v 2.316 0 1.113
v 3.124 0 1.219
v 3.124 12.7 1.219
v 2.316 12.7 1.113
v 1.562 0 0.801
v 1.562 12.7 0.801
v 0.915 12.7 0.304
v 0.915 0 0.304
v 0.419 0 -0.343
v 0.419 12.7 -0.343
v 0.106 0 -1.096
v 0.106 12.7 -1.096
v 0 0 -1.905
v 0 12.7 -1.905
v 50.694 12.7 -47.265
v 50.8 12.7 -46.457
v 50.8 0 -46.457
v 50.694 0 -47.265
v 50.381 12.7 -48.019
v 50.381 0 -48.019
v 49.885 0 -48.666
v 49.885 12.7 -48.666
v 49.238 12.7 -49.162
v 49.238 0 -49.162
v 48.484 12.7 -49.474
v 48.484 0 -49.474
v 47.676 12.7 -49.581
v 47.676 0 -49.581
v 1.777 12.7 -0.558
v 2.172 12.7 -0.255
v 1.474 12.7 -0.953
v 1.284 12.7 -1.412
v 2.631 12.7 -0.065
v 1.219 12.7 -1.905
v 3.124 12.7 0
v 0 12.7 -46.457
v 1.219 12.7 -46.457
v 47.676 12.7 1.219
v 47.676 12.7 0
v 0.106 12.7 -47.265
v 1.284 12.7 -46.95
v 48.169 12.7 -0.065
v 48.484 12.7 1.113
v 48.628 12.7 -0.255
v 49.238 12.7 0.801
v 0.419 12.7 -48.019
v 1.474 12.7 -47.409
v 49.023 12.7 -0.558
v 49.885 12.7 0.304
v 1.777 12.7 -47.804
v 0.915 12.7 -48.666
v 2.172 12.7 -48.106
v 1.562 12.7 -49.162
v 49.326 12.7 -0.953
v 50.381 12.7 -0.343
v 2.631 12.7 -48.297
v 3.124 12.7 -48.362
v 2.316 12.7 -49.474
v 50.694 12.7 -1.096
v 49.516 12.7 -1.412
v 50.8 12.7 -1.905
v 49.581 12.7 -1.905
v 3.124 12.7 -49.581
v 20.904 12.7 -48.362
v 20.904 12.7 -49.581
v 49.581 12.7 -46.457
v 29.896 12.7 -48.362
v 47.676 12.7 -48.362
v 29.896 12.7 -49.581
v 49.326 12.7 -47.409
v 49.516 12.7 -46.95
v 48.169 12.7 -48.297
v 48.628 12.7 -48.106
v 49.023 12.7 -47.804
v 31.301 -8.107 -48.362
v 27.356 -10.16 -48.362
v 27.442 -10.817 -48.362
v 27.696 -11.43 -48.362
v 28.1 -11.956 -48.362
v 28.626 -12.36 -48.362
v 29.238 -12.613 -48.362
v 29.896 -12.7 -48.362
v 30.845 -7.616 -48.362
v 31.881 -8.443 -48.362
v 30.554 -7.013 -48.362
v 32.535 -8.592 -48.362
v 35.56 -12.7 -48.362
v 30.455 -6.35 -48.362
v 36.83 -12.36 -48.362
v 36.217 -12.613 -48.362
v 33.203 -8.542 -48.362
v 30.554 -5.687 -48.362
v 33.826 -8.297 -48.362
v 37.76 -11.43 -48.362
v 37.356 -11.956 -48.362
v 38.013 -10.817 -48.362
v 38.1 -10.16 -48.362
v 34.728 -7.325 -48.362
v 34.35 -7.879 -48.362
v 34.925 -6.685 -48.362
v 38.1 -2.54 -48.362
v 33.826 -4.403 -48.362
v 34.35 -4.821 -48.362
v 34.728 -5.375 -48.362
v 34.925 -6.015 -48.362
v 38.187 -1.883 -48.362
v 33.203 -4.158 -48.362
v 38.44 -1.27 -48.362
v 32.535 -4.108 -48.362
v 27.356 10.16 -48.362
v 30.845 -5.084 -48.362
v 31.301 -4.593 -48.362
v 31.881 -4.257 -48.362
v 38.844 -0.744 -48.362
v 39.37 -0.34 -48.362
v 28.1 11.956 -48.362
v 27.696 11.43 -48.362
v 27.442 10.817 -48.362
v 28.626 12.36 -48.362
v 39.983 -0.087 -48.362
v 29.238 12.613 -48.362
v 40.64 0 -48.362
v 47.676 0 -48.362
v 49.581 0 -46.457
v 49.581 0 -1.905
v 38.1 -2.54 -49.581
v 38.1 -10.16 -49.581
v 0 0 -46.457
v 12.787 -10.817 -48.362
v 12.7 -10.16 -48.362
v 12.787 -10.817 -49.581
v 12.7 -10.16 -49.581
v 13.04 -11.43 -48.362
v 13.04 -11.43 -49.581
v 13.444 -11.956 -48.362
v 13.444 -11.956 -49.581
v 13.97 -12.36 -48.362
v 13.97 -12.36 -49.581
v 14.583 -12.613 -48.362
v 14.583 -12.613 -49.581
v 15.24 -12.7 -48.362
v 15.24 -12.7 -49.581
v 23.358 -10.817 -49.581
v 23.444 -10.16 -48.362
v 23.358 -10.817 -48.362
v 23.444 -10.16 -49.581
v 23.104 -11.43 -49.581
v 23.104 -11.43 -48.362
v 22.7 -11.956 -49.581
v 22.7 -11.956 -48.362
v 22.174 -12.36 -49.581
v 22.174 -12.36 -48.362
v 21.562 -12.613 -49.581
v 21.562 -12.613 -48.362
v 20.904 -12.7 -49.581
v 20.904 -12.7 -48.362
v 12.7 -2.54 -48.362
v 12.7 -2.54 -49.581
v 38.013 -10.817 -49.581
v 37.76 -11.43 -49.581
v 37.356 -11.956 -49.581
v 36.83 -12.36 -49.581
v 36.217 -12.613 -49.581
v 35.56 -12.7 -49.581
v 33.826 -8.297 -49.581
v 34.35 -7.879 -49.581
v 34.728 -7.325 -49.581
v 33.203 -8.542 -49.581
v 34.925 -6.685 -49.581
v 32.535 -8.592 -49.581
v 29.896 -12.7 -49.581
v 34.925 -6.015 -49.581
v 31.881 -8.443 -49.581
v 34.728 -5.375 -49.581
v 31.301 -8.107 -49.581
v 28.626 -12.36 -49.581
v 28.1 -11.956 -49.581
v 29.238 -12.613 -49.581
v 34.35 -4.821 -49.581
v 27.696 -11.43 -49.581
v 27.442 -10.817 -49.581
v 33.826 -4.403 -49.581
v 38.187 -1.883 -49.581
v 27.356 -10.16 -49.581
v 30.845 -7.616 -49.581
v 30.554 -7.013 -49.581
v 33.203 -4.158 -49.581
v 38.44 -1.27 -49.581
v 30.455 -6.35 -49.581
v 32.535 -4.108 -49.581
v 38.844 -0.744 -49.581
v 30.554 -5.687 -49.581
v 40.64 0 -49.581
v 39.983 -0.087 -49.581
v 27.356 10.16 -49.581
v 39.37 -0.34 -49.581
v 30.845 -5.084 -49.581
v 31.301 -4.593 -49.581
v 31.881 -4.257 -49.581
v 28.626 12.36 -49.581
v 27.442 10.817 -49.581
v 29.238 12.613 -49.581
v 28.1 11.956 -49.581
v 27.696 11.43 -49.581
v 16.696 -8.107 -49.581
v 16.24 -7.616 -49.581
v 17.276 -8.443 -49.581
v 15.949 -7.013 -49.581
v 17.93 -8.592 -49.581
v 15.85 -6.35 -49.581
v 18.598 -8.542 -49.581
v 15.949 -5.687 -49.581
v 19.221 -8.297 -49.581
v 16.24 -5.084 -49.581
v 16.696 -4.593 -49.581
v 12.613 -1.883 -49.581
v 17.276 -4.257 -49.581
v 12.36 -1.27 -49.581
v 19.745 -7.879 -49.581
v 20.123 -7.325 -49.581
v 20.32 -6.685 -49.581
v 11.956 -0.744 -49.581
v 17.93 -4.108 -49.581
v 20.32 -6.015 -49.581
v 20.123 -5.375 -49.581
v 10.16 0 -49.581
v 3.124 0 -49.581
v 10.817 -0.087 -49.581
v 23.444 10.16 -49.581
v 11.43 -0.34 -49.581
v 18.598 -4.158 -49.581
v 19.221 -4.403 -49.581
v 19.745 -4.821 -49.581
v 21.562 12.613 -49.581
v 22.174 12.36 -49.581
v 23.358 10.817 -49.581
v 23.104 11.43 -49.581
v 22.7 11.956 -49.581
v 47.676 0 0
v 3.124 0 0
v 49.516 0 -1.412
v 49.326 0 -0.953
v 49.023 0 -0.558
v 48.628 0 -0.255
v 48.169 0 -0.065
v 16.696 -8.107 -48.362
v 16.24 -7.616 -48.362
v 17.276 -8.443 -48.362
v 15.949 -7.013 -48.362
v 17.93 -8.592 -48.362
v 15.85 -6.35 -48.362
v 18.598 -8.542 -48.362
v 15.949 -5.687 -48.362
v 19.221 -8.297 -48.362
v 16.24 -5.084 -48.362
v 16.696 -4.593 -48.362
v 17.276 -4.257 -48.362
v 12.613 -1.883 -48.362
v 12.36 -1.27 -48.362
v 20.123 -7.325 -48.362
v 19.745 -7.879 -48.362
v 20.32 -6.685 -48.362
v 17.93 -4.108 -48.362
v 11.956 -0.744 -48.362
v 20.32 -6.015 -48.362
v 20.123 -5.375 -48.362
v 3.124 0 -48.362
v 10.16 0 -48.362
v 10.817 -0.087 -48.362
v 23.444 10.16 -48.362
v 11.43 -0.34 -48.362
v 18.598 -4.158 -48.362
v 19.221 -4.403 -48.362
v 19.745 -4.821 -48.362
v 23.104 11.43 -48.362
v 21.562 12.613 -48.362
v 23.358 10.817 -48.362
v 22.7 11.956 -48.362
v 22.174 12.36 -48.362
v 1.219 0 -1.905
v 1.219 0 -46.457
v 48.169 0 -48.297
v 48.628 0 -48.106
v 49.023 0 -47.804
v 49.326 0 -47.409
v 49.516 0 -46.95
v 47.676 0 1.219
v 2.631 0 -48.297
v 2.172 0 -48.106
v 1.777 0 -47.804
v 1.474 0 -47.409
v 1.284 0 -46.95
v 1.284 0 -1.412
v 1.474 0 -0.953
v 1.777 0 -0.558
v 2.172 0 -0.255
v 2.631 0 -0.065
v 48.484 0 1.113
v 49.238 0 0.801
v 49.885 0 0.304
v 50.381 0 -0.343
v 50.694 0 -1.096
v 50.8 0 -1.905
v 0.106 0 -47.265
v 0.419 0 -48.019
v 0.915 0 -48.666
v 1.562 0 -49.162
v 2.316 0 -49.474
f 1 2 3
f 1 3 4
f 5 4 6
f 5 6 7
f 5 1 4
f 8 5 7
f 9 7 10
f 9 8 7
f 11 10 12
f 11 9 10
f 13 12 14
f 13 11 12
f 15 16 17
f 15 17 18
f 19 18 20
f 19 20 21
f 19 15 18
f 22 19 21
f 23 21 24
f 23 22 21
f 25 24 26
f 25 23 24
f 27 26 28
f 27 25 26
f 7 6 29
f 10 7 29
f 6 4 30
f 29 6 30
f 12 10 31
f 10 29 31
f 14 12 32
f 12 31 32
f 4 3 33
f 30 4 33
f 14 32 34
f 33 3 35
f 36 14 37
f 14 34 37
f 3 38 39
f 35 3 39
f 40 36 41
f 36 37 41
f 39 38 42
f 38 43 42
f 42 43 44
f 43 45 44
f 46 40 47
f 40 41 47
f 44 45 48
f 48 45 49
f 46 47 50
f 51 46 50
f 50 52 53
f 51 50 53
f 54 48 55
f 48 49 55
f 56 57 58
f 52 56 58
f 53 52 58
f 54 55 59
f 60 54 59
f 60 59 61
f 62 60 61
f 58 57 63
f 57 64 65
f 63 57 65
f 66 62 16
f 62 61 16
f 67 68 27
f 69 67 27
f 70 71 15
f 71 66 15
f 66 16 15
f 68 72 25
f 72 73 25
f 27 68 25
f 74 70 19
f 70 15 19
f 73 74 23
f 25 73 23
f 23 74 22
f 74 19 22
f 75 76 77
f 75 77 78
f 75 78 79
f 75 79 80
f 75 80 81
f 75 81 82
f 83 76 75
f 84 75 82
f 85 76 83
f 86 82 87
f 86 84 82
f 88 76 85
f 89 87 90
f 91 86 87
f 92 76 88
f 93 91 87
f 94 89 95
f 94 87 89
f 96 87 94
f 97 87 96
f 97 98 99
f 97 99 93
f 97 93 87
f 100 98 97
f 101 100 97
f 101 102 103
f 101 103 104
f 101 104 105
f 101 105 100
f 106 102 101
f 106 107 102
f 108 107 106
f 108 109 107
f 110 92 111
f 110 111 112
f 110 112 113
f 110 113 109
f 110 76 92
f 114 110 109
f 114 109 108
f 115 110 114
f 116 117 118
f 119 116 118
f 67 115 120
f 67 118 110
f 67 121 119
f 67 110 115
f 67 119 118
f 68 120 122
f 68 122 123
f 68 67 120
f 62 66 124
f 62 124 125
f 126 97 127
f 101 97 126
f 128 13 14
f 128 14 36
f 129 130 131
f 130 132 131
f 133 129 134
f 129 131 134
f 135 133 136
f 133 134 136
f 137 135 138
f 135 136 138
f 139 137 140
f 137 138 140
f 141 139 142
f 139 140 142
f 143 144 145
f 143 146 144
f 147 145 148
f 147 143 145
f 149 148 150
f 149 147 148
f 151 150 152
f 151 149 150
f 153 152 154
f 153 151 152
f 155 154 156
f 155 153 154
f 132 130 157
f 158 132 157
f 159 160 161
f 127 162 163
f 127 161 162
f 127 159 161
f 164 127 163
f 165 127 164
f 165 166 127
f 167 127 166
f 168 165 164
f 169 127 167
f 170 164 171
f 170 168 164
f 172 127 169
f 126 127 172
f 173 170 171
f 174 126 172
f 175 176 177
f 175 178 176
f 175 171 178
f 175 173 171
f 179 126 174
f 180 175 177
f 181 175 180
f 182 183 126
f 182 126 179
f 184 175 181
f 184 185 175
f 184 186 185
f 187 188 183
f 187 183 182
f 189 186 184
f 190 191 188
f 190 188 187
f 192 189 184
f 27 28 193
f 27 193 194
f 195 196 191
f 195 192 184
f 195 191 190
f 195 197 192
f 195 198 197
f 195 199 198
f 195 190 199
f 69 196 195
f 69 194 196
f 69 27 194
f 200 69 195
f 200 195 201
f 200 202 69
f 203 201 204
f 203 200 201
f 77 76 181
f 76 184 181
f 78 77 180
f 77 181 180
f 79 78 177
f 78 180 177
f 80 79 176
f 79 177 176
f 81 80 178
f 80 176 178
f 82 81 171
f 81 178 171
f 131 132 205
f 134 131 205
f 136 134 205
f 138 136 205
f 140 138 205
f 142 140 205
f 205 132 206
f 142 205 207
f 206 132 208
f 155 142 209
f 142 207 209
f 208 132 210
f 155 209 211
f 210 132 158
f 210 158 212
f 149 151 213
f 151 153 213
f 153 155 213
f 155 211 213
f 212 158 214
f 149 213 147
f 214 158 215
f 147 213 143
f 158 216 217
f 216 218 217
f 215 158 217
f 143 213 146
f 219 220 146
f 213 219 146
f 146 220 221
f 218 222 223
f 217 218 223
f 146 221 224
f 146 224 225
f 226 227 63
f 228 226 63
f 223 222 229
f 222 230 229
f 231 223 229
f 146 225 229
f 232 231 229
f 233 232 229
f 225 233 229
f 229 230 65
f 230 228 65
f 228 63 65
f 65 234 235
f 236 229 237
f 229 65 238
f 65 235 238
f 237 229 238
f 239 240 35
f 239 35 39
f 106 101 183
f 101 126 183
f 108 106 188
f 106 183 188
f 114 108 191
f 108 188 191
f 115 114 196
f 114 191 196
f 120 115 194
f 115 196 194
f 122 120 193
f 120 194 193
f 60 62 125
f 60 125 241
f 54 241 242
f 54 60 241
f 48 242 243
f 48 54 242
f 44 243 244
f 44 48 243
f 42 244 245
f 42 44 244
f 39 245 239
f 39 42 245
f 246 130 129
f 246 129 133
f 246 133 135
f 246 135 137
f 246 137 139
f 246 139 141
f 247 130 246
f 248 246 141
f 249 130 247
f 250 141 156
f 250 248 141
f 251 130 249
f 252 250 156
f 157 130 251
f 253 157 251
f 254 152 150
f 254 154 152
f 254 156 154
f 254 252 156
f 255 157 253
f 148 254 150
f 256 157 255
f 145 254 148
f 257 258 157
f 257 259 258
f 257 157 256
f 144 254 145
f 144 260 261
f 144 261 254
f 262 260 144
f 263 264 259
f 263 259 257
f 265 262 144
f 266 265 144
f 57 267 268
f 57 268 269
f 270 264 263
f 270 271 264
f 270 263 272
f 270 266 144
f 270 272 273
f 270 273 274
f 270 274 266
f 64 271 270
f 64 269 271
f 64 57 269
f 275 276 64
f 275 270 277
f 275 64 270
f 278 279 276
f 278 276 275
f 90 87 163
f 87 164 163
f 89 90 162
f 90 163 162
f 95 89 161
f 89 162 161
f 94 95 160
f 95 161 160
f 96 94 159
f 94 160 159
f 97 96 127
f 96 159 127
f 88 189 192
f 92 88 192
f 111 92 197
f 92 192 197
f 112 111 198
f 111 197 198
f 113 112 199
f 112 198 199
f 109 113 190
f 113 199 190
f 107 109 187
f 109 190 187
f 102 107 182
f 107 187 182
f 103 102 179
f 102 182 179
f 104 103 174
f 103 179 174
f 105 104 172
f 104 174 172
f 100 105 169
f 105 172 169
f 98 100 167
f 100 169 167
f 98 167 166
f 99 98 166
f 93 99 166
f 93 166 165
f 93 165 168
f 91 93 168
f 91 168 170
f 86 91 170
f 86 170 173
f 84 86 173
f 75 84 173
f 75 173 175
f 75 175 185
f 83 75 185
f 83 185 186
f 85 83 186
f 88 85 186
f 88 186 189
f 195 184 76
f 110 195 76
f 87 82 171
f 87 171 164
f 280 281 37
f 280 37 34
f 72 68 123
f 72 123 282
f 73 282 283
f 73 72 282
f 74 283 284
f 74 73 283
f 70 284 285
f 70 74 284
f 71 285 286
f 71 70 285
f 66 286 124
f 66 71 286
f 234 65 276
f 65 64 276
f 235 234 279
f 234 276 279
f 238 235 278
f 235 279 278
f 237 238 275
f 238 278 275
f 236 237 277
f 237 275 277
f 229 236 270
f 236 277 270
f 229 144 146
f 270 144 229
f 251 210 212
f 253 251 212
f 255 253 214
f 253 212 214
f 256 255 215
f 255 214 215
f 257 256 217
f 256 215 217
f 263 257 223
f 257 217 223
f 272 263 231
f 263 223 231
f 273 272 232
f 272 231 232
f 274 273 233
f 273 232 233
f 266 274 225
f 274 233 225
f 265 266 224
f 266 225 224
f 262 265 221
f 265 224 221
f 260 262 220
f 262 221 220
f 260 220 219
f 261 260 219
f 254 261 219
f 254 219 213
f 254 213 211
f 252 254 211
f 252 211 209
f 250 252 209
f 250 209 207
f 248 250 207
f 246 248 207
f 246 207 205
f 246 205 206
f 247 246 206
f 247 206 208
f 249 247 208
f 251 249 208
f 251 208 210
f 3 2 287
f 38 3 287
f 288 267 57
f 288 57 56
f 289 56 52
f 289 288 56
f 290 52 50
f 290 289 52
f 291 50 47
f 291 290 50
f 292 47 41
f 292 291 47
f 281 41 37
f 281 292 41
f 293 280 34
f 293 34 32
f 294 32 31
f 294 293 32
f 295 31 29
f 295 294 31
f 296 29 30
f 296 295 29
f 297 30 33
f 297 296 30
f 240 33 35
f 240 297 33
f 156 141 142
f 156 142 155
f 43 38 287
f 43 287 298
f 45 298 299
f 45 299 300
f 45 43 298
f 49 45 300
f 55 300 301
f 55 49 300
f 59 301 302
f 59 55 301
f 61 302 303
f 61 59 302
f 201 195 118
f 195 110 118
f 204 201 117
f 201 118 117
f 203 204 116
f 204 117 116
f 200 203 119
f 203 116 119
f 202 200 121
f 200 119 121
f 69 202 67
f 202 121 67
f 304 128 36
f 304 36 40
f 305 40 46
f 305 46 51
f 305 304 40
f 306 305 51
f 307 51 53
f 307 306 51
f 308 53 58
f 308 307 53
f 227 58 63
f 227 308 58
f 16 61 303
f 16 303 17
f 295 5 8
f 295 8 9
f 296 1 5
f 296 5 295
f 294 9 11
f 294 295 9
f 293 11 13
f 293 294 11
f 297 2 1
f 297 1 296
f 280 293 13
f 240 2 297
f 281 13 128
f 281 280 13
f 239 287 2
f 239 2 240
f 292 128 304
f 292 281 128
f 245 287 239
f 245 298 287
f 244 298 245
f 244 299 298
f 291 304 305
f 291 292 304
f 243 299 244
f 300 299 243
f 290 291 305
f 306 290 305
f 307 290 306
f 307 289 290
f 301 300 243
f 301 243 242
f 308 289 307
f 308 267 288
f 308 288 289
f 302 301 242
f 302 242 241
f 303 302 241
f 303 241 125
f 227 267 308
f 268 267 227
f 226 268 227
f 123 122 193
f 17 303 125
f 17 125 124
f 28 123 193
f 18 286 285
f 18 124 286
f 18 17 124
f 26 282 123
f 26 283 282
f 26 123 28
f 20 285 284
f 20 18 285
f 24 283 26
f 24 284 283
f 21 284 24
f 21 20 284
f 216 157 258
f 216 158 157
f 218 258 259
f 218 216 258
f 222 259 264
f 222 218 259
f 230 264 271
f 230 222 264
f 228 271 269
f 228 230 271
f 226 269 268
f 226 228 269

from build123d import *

# Parameters (mm, degrees)
SKETCH1_W                      = 50.8
SKETCH1_H                      = 1.2192
BASE_FLANGE1_DEPTH             = 12.7
EDGE_FLANGE1_STRIP_W           = 8.6868
EDGE_FLANGE1_STRIP_H           = 1.2192
EDGE_FLANGE1_STRIP_CUT_DEPTH   = 12.7
EDGE_FLANGE1_STRIP_2_W         = 8.6868
EDGE_FLANGE1_STRIP_2_H         = 1.2192
EDGE_FLANGE1_STRIP_CUT_2_DEPTH = 12.7
EDGE_FLANGE1_DEPTH             = 12.7
EDGE_FLANGE1_BEND_DEPTH        = 12.7
EDGE_FLANGE2_STRIP_W           = 8.6868
EDGE_FLANGE2_STRIP_H           = 1.2192
EDGE_FLANGE2_STRIP_CUT_DEPTH   = 12.7
EDGE_FLANGE2_DEPTH             = 12.7
EDGE_FLANGE3_STRIP_W           = 8.6868
EDGE_FLANGE3_STRIP_H           = 1.2192
EDGE_FLANGE3_STRIP_CUT_DEPTH   = 12.7
EDGE_FLANGE3_DEPTH             = 12.7
SKETCH18_W                     = 10.7442
SKETCH18_H                     = 12.7
BOSS_EXTRUDE1_DEPTH            = 1.2192
FILLET1_R                      = 2.54
F_8_CLEARANCE_HOLE1_D          = 4.4958


# Sheet-metal steps are written as plain solids
with BuildPart() as part:
    # Sketch1 → Base-Flange1 (new body)
    with BuildSketch(Plane(origin=(0, 0, 0), x_dir=(1, 0, 0), z_dir=(0, 1, 0))):
        with Locations((25.4, -0.6096)):
            Rectangle(SKETCH1_W, SKETCH1_H)
    extrude(amount=BASE_FLANGE1_DEPTH)

    # Edge-Flange1 strip (across the edge) → Edge-Flange1 strip cut (cut)
    with BuildSketch(Plane(origin=(50.8, 12.7, 0), x_dir=(-1, 0, 0), z_dir=(0, -1, 0))):
        with Locations((-1.2192, -0.6096)):
            Rectangle(EDGE_FLANGE1_STRIP_W, EDGE_FLANGE1_STRIP_H)
    extrude(amount=EDGE_FLANGE1_STRIP_CUT_DEPTH, mode=Mode.SUBTRACT)

    # Edge-Flange1 strip 2 (across the edge) → Edge-Flange1 strip cut 2 (cut)
    with BuildSketch(Plane(origin=(0, 0, 0), x_dir=(1, 0, 0), z_dir=(0, 1, 0))):
        with Locations((-1.2192, -0.6096)):
            Rectangle(EDGE_FLANGE1_STRIP_2_W, EDGE_FLANGE1_STRIP_2_H)
    extrude(amount=EDGE_FLANGE1_STRIP_CUT_2_DEPTH, mode=Mode.SUBTRACT)

    # Edge-Flange1 section (across the edge) → Edge-Flange1 (add)
    with BuildSketch(Plane(origin=(50.8, 12.7, 0), x_dir=(-1, 0, 0), z_dir=(0, -1, 0))):
        with BuildLine():
            Line((0, 1.905), (0, 49.5808))
            Line((0, 49.5808), (1.2192, 49.5808))
            Line((1.2192, 49.5808), (1.2192, 1.905))
            ThreePointArc((1.2192, 1.905), (1.777161582, 0.557961582), (3.1242, 0))
            Line((3.1242, 0), (3.1242, -1.2192))
            ThreePointArc((3.1242, -1.2192), (0.915056994, -0.304143006), (0, 1.905))
        make_face()
    extrude(amount=EDGE_FLANGE1_DEPTH)

    # Edge-Flange1 section 2 (across the edge) → Edge-Flange1 bend (add)
    with BuildSketch(Plane(origin=(0, 0, 0), x_dir=(1, 0, 0), z_dir=(0, 1, 0))):
        with BuildLine():
            Line((0, 1.905), (0, 49.5808))
            Line((0, 49.5808), (1.2192, 49.5808))
            Line((1.2192, 49.5808), (1.2192, 1.905))
            ThreePointArc((1.2192, 1.905), (1.777161582, 0.557961582), (3.1242, 0))
            Line((3.1242, 0), (3.1242, -1.2192))
            ThreePointArc((3.1242, -1.2192), (0.915056994, -0.304143006), (0, 1.905))
        make_face()
    extrude(amount=EDGE_FLANGE1_BEND_DEPTH)

    # Edge-Flange2 strip (across the edge) → Edge-Flange2 strip cut (cut)
    with BuildSketch(Plane(origin=(49.5808, 12.7, -49.5808), x_dir=(0, 0, 1), z_dir=(0, -1, 0))):
        with Locations((-1.2192, -0.6096)):
            Rectangle(EDGE_FLANGE2_STRIP_W, EDGE_FLANGE2_STRIP_H)
    extrude(amount=EDGE_FLANGE2_STRIP_CUT_DEPTH, mode=Mode.SUBTRACT)

    # Edge-Flange2 section (across the edge) → Edge-Flange2 (add)
    with BuildSketch(Plane(origin=(49.5808, 12.7, -49.5808), x_dir=(0, 0, 1), z_dir=(0, -1, 0))):
        with BuildLine():
            Line((0, 1.905), (0, 22.225))
            Line((0, 22.225), (1.2192, 22.225))
            Line((1.2192, 22.225), (1.2192, 1.905))
            ThreePointArc((1.2192, 1.905), (1.777161582, 0.557961582), (3.1242, 0))
            Line((3.1242, 0), (3.1242, -1.2192))
            ThreePointArc((3.1242, -1.2192), (0.915056994, -0.304143006), (0, 1.905))
        make_face()
    extrude(amount=EDGE_FLANGE2_DEPTH)

    # Edge-Flange3 strip (across the edge) → Edge-Flange3 strip cut (cut)
    with BuildSketch(Plane(origin=(1.2192, 0, -49.5808), x_dir=(0, 0, 1), z_dir=(0, 1, 0))):
        with Locations((-1.2192, -0.6096)):
            Rectangle(EDGE_FLANGE3_STRIP_W, EDGE_FLANGE3_STRIP_H)
    extrude(amount=EDGE_FLANGE3_STRIP_CUT_DEPTH, mode=Mode.SUBTRACT)

    # Edge-Flange3 section (across the edge) → Edge-Flange3 (add)
    with BuildSketch(Plane(origin=(1.2192, 0, -49.5808), x_dir=(0, 0, 1), z_dir=(0, 1, 0))):
        with BuildLine():
            Line((0, 1.905), (0, 22.225))
            Line((0, 22.225), (1.2192, 22.225))
            Line((1.2192, 22.225), (1.2192, 1.905))
            ThreePointArc((1.2192, 1.905), (1.777161582, 0.557961582), (3.1242, 0))
            Line((3.1242, 0), (3.1242, -1.2192))
            ThreePointArc((3.1242, -1.2192), (0.915056994, -0.304143006), (0, 1.905))
        make_face()
    extrude(amount=EDGE_FLANGE3_DEPTH)

    # Sketch18 → Boss-Extrude1 (add)
    with BuildSketch(Plane.XY.offset(-48.3616)):
        with Locations((18.0721, -6.35)):
            Rectangle(SKETCH18_W, SKETCH18_H)
        with Locations((32.7279, -6.35)):
            Rectangle(SKETCH18_W, SKETCH18_H)
    extrude(amount=-BOSS_EXTRUDE1_DEPTH)

    # Fillet1
    fillet1_edges = [part.edges().sort_by_distance(p)[0] for p in [
        (23.4442, 12.7, -48.9712),
        (12.7, 0, -48.9712),
        (12.7, -12.7, -48.9712),
        (23.4442, -12.7, -48.9712),
        (38.1, -12.7, -48.9712),
        (38.1, 0, -48.9712),
        (27.3558, -12.7, -48.9712),
        (27.3558, 12.7, -48.9712),
    ]]
    fillet(fillet1_edges, radius=FILLET1_R)

    # #8 Clearance Hole1 (through all)
    with Locations(Plane.XY.offset(-48.3616)):
        with Locations((18.0975, -6.35), (32.7025, -6.35)):
            Hole(F_8_CLEARANCE_HOLE1_D / 2)


solid = part.part
